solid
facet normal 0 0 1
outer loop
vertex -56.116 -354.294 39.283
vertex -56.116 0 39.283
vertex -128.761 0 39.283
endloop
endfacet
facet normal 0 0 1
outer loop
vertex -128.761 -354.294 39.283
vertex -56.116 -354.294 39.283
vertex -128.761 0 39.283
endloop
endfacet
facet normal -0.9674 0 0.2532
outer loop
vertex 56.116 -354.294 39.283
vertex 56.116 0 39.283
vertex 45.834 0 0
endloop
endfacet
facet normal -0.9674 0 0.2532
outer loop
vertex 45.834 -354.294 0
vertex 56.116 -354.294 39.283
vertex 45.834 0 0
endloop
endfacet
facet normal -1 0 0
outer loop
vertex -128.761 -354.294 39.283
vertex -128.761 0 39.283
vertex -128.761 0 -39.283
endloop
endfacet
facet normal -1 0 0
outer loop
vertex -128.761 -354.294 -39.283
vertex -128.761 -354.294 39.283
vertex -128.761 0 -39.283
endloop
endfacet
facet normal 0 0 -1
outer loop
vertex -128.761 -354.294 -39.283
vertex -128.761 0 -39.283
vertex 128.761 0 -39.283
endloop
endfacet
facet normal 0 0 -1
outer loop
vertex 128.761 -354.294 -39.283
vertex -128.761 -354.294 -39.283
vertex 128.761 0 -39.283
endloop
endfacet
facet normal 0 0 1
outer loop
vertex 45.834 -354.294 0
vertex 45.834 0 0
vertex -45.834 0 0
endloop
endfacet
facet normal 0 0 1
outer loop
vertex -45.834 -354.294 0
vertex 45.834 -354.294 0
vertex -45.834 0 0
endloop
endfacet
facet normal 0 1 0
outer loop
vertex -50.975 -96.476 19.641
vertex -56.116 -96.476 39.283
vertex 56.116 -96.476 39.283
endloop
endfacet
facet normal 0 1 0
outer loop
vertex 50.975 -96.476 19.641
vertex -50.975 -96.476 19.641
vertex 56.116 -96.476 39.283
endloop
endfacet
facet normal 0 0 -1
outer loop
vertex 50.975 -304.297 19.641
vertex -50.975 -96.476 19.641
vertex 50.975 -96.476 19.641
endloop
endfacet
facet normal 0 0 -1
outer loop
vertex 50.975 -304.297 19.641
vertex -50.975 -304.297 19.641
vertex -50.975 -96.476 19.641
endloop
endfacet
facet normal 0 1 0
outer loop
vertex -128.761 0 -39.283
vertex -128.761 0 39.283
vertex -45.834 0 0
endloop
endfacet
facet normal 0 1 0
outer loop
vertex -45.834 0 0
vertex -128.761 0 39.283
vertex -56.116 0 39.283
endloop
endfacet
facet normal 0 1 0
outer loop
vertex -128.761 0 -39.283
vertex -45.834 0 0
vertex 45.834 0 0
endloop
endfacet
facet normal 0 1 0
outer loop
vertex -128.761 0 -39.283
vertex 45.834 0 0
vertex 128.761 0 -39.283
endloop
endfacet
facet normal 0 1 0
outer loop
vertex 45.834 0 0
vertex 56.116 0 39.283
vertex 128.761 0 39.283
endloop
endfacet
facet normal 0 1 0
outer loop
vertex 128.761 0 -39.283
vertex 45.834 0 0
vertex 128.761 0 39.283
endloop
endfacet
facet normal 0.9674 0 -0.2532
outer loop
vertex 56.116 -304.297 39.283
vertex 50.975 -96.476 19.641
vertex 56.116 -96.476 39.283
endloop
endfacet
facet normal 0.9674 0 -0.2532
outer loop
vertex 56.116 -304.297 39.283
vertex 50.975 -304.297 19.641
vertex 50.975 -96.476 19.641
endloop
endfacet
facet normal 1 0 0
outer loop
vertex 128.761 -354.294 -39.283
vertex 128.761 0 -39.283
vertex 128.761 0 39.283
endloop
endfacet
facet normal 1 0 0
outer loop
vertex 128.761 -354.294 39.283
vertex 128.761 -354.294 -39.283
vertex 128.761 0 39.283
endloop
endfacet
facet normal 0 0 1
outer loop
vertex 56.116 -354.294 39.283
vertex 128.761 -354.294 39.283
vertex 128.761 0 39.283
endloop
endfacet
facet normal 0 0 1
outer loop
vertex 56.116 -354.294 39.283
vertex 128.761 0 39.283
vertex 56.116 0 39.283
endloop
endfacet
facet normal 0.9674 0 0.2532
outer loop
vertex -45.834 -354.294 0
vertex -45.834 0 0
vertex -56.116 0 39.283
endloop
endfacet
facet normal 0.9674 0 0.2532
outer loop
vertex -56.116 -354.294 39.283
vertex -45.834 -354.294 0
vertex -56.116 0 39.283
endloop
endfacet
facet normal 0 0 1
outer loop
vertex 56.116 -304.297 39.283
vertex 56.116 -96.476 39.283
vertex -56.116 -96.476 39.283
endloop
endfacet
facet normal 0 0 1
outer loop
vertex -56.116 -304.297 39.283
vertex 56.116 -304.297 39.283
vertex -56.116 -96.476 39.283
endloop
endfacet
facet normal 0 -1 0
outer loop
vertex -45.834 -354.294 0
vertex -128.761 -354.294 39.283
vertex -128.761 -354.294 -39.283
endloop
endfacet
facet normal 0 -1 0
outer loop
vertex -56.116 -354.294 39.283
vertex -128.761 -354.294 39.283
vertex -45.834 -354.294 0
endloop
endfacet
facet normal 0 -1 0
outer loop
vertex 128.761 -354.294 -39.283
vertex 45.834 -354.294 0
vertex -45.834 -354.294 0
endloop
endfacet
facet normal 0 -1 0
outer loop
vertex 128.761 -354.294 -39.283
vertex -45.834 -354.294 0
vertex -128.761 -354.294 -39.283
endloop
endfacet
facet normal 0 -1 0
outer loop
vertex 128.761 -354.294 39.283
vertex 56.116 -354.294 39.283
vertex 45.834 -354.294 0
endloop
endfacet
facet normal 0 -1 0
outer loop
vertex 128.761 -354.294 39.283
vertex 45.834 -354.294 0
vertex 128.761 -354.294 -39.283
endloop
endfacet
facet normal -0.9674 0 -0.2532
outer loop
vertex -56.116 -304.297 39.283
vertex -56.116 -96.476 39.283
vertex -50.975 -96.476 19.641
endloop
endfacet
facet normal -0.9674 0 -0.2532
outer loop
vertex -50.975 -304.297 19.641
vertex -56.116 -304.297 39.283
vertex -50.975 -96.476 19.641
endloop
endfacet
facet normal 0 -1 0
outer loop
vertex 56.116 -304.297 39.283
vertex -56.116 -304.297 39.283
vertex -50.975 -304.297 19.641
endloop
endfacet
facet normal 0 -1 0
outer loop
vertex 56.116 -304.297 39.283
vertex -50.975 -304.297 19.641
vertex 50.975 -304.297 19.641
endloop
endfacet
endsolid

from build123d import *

# Parameters (mm, degrees)
F1_DEPTH = 354.294151
F3_DEPTH = 507.262468
F6_DEPTH = 103.910476


with BuildPart() as f1:
    # F0 (on Front) → F1 (new body)
    with BuildSketch(Plane.XZ):
        Polygon((128.760651, -39.282918), (128.760651, 39.282918), (34.918144, 39.282918), (-34.918144, 39.282918), (-128.760651, 39.282918), (-128.760651, -39.282918), align=None)
    extrude(amount=F1_DEPTH)

    # F2 (on face) → F3 (cut)
    with BuildSketch(Plane(origin=(0, 0, 0), x_dir=(-1, 0, 0), z_dir=(0, 1, 0))):
        Polygon((-45.834273, 0), (0, 0), (45.834273, 0), (71.626529, 98.541476), (45.834273, 106.292709), (45.834273, 120.067082), (0, 120.067082), (-45.834273, 120.067082), (-45.834273, 106.292709), (-71.626529, 98.541476), align=None)
    extrude(amount=-F3_DEPTH, mode=Mode.SUBTRACT)


with BuildPart() as f6:
    # F5 (on offset) → F6 (new body, symmetric)
    with BuildSketch(Plane.XZ.offset(200.386047)):
        Polygon((50.975231, 19.641459), (56.116188, 39.282918), (-56.116188, 39.282918), (-50.975231, 19.641459), align=None)
    extrude(amount=F6_DEPTH, both=True)


solid = Compound([f1.part, f6.part])
